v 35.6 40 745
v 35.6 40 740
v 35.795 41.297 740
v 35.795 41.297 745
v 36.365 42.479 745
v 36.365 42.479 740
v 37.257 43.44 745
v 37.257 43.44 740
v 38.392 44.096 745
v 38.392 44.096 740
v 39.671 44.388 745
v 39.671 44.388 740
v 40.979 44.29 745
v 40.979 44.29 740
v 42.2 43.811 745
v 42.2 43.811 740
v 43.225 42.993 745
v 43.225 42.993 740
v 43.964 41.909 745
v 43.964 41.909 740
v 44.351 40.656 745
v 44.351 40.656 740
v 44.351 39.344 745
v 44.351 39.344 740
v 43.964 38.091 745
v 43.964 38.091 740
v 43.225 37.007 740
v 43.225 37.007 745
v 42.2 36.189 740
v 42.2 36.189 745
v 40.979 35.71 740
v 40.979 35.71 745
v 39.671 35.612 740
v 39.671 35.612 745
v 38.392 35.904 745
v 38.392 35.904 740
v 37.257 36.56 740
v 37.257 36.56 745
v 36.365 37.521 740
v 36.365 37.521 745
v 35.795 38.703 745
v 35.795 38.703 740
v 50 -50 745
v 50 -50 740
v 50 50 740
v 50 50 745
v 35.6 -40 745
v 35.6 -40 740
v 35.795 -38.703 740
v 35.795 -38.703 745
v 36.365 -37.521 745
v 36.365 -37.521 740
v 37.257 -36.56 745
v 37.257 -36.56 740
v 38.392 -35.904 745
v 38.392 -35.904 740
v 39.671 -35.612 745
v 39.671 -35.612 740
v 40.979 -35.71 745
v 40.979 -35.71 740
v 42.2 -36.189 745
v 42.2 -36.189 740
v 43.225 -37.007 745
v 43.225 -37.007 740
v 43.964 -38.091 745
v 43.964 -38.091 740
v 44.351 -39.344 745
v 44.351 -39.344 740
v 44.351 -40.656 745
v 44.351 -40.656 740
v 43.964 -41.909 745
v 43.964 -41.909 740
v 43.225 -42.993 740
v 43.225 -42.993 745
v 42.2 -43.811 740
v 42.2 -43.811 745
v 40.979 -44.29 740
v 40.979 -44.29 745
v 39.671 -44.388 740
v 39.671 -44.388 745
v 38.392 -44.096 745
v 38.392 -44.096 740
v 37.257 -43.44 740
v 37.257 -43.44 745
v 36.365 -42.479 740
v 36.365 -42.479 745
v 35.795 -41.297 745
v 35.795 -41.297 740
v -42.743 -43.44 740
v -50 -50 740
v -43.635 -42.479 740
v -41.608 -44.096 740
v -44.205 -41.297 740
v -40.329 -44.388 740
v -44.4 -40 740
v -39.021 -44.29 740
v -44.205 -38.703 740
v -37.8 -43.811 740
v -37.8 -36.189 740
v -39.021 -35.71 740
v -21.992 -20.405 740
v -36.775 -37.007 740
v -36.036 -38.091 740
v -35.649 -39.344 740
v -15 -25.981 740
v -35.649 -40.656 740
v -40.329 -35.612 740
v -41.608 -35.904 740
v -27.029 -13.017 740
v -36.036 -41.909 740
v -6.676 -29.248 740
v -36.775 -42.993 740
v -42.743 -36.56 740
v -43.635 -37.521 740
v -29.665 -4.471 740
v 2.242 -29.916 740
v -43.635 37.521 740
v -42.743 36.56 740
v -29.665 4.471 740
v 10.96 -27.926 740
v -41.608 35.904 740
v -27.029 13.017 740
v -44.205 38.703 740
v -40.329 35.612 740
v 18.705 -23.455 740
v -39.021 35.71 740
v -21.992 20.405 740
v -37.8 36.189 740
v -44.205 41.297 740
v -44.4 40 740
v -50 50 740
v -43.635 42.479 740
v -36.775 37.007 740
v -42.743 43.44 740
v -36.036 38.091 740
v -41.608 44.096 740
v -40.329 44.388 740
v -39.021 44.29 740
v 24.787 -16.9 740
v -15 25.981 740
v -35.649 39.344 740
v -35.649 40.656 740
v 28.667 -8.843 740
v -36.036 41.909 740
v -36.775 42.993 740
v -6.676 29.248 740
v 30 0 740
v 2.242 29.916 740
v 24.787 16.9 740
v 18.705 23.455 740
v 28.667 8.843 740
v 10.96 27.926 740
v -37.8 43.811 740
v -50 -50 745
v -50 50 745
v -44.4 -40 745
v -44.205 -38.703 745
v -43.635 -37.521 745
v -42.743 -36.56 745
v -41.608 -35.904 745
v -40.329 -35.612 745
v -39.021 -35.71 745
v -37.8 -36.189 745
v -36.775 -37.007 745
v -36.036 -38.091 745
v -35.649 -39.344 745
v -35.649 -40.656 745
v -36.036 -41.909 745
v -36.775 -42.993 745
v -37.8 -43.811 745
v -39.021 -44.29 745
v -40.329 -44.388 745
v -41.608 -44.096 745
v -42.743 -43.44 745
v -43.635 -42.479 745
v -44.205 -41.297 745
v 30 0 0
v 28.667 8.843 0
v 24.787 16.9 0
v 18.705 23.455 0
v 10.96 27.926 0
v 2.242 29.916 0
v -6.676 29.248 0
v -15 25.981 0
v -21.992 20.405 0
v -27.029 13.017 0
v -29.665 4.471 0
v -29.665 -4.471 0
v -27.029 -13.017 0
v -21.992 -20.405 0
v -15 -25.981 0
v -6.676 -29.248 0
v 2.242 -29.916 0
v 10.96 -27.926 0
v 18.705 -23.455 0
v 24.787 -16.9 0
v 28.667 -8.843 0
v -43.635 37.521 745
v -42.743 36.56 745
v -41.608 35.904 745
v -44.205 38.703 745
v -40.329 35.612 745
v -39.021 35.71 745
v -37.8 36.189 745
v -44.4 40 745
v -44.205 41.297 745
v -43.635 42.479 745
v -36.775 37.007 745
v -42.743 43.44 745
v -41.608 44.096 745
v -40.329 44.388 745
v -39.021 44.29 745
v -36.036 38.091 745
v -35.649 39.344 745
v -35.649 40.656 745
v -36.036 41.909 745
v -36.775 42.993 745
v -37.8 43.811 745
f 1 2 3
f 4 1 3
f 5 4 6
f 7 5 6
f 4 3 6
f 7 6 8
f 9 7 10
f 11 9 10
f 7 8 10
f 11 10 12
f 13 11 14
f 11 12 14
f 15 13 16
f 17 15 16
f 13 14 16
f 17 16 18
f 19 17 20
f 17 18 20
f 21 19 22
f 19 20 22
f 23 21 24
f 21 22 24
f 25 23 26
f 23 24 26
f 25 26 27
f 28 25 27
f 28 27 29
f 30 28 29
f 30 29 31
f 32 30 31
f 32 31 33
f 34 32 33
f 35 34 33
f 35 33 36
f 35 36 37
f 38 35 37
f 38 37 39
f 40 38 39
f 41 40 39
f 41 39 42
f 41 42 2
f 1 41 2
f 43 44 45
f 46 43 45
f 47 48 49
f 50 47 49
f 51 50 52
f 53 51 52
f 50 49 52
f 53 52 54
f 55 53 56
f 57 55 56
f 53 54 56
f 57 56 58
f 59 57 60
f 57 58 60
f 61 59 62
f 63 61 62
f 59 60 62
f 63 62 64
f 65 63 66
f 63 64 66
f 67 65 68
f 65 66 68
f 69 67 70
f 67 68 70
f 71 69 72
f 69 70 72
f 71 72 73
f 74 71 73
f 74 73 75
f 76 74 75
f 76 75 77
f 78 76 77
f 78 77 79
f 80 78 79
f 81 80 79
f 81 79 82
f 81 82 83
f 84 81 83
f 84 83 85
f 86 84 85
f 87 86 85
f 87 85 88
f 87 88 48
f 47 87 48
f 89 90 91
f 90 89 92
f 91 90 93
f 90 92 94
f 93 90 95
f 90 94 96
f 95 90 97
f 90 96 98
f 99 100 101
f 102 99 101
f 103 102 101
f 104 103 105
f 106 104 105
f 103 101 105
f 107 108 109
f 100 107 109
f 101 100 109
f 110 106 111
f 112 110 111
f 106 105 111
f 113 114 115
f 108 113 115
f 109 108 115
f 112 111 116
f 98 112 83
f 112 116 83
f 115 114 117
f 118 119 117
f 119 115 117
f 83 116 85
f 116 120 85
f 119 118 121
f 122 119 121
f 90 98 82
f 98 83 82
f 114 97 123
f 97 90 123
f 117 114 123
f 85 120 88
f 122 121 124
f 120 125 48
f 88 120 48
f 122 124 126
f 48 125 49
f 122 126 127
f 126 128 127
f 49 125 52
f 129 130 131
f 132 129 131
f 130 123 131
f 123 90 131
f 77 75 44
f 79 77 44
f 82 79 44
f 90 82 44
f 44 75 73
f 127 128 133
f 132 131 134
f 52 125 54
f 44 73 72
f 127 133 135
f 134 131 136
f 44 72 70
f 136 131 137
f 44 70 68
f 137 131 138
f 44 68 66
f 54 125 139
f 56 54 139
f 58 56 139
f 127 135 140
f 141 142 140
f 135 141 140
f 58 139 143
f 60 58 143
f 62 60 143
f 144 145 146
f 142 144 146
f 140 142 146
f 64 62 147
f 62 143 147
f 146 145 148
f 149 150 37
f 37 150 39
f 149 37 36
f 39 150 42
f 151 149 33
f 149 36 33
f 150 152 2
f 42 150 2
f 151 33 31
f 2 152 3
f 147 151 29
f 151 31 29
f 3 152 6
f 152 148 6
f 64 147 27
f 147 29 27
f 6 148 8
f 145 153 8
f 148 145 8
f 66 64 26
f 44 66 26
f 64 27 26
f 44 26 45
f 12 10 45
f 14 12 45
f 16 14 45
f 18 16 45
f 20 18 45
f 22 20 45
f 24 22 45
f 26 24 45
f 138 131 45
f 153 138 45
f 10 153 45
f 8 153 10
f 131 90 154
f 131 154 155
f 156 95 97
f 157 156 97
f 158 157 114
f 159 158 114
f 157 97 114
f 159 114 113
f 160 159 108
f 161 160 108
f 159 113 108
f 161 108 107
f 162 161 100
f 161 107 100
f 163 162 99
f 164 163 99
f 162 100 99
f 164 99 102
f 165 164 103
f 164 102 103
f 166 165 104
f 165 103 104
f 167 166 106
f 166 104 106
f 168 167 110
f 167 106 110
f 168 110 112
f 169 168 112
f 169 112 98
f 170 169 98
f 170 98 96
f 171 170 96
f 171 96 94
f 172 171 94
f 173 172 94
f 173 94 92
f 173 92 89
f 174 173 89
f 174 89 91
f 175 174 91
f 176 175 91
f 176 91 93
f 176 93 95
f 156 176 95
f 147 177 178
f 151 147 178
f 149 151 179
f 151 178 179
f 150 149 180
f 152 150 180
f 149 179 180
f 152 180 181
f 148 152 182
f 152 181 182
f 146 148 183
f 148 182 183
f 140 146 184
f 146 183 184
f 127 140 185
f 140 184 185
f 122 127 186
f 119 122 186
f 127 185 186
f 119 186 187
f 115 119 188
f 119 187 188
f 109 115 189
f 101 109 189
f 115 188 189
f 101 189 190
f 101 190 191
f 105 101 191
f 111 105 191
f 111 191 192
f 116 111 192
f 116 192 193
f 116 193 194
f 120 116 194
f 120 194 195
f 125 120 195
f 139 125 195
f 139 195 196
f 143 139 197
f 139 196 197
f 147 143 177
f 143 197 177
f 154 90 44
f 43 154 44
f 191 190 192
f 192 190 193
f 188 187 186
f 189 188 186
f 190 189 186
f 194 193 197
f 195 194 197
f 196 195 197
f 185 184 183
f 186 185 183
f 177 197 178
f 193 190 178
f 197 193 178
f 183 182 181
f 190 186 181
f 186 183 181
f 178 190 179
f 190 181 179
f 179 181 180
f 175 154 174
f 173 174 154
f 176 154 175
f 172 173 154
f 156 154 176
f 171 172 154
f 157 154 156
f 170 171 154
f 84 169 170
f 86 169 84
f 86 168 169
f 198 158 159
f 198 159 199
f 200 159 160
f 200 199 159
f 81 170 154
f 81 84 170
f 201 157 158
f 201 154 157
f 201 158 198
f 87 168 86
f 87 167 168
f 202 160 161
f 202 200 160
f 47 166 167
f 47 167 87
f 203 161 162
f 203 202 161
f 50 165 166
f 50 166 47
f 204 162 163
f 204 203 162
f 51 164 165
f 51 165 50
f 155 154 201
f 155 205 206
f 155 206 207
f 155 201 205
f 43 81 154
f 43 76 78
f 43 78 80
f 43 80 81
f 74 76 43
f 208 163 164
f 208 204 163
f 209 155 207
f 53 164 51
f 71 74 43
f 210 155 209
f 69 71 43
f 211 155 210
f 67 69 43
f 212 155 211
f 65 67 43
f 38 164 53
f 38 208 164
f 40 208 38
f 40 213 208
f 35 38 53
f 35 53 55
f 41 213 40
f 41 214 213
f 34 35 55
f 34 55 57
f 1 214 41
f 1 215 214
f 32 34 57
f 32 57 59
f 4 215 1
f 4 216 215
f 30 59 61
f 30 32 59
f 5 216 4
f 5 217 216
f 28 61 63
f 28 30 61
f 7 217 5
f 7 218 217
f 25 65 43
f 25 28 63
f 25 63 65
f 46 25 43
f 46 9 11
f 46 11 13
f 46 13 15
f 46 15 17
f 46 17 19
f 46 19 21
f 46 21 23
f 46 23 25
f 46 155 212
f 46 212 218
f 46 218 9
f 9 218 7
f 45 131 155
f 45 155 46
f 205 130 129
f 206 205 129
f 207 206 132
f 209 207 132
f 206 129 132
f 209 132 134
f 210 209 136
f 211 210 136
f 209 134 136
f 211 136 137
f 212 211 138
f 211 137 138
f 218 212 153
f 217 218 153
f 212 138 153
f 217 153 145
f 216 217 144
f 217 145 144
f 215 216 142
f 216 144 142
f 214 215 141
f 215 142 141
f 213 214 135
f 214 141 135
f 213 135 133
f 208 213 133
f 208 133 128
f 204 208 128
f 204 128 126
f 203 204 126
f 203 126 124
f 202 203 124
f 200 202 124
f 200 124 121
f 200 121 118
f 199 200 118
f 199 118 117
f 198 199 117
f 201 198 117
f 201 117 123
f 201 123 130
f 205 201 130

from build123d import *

# Parameters (mm, degrees)
F0_R     = 30
F1_DEPTH = 740
F2_W     = 100
F2_H     = 100
F2_R     = 30
F3_DEPTH = 5
F5_D     = 8.8


with BuildPart() as f1:
    # F0 (on Top) → F1 (new body)
    with BuildSketch(Plane.XY):
        Circle(F0_R)
    extrude(amount=F1_DEPTH)

    # F2 (on face) → F3 (join)
    with BuildSketch(Plane.XY.offset(740)):
        Rectangle(F2_W, F2_H)
        Circle(F2_R, mode=Mode.SUBTRACT)
        Circle(F2_R)
    extrude(amount=F3_DEPTH)

    # F5 (through all)
    with Locations(Plane.XY.offset(745)):
        with Locations((-40, 40), (40, 40), (40, -40), (-40, -40)):
            Hole(F5_D / 2)


solid = f1.part
